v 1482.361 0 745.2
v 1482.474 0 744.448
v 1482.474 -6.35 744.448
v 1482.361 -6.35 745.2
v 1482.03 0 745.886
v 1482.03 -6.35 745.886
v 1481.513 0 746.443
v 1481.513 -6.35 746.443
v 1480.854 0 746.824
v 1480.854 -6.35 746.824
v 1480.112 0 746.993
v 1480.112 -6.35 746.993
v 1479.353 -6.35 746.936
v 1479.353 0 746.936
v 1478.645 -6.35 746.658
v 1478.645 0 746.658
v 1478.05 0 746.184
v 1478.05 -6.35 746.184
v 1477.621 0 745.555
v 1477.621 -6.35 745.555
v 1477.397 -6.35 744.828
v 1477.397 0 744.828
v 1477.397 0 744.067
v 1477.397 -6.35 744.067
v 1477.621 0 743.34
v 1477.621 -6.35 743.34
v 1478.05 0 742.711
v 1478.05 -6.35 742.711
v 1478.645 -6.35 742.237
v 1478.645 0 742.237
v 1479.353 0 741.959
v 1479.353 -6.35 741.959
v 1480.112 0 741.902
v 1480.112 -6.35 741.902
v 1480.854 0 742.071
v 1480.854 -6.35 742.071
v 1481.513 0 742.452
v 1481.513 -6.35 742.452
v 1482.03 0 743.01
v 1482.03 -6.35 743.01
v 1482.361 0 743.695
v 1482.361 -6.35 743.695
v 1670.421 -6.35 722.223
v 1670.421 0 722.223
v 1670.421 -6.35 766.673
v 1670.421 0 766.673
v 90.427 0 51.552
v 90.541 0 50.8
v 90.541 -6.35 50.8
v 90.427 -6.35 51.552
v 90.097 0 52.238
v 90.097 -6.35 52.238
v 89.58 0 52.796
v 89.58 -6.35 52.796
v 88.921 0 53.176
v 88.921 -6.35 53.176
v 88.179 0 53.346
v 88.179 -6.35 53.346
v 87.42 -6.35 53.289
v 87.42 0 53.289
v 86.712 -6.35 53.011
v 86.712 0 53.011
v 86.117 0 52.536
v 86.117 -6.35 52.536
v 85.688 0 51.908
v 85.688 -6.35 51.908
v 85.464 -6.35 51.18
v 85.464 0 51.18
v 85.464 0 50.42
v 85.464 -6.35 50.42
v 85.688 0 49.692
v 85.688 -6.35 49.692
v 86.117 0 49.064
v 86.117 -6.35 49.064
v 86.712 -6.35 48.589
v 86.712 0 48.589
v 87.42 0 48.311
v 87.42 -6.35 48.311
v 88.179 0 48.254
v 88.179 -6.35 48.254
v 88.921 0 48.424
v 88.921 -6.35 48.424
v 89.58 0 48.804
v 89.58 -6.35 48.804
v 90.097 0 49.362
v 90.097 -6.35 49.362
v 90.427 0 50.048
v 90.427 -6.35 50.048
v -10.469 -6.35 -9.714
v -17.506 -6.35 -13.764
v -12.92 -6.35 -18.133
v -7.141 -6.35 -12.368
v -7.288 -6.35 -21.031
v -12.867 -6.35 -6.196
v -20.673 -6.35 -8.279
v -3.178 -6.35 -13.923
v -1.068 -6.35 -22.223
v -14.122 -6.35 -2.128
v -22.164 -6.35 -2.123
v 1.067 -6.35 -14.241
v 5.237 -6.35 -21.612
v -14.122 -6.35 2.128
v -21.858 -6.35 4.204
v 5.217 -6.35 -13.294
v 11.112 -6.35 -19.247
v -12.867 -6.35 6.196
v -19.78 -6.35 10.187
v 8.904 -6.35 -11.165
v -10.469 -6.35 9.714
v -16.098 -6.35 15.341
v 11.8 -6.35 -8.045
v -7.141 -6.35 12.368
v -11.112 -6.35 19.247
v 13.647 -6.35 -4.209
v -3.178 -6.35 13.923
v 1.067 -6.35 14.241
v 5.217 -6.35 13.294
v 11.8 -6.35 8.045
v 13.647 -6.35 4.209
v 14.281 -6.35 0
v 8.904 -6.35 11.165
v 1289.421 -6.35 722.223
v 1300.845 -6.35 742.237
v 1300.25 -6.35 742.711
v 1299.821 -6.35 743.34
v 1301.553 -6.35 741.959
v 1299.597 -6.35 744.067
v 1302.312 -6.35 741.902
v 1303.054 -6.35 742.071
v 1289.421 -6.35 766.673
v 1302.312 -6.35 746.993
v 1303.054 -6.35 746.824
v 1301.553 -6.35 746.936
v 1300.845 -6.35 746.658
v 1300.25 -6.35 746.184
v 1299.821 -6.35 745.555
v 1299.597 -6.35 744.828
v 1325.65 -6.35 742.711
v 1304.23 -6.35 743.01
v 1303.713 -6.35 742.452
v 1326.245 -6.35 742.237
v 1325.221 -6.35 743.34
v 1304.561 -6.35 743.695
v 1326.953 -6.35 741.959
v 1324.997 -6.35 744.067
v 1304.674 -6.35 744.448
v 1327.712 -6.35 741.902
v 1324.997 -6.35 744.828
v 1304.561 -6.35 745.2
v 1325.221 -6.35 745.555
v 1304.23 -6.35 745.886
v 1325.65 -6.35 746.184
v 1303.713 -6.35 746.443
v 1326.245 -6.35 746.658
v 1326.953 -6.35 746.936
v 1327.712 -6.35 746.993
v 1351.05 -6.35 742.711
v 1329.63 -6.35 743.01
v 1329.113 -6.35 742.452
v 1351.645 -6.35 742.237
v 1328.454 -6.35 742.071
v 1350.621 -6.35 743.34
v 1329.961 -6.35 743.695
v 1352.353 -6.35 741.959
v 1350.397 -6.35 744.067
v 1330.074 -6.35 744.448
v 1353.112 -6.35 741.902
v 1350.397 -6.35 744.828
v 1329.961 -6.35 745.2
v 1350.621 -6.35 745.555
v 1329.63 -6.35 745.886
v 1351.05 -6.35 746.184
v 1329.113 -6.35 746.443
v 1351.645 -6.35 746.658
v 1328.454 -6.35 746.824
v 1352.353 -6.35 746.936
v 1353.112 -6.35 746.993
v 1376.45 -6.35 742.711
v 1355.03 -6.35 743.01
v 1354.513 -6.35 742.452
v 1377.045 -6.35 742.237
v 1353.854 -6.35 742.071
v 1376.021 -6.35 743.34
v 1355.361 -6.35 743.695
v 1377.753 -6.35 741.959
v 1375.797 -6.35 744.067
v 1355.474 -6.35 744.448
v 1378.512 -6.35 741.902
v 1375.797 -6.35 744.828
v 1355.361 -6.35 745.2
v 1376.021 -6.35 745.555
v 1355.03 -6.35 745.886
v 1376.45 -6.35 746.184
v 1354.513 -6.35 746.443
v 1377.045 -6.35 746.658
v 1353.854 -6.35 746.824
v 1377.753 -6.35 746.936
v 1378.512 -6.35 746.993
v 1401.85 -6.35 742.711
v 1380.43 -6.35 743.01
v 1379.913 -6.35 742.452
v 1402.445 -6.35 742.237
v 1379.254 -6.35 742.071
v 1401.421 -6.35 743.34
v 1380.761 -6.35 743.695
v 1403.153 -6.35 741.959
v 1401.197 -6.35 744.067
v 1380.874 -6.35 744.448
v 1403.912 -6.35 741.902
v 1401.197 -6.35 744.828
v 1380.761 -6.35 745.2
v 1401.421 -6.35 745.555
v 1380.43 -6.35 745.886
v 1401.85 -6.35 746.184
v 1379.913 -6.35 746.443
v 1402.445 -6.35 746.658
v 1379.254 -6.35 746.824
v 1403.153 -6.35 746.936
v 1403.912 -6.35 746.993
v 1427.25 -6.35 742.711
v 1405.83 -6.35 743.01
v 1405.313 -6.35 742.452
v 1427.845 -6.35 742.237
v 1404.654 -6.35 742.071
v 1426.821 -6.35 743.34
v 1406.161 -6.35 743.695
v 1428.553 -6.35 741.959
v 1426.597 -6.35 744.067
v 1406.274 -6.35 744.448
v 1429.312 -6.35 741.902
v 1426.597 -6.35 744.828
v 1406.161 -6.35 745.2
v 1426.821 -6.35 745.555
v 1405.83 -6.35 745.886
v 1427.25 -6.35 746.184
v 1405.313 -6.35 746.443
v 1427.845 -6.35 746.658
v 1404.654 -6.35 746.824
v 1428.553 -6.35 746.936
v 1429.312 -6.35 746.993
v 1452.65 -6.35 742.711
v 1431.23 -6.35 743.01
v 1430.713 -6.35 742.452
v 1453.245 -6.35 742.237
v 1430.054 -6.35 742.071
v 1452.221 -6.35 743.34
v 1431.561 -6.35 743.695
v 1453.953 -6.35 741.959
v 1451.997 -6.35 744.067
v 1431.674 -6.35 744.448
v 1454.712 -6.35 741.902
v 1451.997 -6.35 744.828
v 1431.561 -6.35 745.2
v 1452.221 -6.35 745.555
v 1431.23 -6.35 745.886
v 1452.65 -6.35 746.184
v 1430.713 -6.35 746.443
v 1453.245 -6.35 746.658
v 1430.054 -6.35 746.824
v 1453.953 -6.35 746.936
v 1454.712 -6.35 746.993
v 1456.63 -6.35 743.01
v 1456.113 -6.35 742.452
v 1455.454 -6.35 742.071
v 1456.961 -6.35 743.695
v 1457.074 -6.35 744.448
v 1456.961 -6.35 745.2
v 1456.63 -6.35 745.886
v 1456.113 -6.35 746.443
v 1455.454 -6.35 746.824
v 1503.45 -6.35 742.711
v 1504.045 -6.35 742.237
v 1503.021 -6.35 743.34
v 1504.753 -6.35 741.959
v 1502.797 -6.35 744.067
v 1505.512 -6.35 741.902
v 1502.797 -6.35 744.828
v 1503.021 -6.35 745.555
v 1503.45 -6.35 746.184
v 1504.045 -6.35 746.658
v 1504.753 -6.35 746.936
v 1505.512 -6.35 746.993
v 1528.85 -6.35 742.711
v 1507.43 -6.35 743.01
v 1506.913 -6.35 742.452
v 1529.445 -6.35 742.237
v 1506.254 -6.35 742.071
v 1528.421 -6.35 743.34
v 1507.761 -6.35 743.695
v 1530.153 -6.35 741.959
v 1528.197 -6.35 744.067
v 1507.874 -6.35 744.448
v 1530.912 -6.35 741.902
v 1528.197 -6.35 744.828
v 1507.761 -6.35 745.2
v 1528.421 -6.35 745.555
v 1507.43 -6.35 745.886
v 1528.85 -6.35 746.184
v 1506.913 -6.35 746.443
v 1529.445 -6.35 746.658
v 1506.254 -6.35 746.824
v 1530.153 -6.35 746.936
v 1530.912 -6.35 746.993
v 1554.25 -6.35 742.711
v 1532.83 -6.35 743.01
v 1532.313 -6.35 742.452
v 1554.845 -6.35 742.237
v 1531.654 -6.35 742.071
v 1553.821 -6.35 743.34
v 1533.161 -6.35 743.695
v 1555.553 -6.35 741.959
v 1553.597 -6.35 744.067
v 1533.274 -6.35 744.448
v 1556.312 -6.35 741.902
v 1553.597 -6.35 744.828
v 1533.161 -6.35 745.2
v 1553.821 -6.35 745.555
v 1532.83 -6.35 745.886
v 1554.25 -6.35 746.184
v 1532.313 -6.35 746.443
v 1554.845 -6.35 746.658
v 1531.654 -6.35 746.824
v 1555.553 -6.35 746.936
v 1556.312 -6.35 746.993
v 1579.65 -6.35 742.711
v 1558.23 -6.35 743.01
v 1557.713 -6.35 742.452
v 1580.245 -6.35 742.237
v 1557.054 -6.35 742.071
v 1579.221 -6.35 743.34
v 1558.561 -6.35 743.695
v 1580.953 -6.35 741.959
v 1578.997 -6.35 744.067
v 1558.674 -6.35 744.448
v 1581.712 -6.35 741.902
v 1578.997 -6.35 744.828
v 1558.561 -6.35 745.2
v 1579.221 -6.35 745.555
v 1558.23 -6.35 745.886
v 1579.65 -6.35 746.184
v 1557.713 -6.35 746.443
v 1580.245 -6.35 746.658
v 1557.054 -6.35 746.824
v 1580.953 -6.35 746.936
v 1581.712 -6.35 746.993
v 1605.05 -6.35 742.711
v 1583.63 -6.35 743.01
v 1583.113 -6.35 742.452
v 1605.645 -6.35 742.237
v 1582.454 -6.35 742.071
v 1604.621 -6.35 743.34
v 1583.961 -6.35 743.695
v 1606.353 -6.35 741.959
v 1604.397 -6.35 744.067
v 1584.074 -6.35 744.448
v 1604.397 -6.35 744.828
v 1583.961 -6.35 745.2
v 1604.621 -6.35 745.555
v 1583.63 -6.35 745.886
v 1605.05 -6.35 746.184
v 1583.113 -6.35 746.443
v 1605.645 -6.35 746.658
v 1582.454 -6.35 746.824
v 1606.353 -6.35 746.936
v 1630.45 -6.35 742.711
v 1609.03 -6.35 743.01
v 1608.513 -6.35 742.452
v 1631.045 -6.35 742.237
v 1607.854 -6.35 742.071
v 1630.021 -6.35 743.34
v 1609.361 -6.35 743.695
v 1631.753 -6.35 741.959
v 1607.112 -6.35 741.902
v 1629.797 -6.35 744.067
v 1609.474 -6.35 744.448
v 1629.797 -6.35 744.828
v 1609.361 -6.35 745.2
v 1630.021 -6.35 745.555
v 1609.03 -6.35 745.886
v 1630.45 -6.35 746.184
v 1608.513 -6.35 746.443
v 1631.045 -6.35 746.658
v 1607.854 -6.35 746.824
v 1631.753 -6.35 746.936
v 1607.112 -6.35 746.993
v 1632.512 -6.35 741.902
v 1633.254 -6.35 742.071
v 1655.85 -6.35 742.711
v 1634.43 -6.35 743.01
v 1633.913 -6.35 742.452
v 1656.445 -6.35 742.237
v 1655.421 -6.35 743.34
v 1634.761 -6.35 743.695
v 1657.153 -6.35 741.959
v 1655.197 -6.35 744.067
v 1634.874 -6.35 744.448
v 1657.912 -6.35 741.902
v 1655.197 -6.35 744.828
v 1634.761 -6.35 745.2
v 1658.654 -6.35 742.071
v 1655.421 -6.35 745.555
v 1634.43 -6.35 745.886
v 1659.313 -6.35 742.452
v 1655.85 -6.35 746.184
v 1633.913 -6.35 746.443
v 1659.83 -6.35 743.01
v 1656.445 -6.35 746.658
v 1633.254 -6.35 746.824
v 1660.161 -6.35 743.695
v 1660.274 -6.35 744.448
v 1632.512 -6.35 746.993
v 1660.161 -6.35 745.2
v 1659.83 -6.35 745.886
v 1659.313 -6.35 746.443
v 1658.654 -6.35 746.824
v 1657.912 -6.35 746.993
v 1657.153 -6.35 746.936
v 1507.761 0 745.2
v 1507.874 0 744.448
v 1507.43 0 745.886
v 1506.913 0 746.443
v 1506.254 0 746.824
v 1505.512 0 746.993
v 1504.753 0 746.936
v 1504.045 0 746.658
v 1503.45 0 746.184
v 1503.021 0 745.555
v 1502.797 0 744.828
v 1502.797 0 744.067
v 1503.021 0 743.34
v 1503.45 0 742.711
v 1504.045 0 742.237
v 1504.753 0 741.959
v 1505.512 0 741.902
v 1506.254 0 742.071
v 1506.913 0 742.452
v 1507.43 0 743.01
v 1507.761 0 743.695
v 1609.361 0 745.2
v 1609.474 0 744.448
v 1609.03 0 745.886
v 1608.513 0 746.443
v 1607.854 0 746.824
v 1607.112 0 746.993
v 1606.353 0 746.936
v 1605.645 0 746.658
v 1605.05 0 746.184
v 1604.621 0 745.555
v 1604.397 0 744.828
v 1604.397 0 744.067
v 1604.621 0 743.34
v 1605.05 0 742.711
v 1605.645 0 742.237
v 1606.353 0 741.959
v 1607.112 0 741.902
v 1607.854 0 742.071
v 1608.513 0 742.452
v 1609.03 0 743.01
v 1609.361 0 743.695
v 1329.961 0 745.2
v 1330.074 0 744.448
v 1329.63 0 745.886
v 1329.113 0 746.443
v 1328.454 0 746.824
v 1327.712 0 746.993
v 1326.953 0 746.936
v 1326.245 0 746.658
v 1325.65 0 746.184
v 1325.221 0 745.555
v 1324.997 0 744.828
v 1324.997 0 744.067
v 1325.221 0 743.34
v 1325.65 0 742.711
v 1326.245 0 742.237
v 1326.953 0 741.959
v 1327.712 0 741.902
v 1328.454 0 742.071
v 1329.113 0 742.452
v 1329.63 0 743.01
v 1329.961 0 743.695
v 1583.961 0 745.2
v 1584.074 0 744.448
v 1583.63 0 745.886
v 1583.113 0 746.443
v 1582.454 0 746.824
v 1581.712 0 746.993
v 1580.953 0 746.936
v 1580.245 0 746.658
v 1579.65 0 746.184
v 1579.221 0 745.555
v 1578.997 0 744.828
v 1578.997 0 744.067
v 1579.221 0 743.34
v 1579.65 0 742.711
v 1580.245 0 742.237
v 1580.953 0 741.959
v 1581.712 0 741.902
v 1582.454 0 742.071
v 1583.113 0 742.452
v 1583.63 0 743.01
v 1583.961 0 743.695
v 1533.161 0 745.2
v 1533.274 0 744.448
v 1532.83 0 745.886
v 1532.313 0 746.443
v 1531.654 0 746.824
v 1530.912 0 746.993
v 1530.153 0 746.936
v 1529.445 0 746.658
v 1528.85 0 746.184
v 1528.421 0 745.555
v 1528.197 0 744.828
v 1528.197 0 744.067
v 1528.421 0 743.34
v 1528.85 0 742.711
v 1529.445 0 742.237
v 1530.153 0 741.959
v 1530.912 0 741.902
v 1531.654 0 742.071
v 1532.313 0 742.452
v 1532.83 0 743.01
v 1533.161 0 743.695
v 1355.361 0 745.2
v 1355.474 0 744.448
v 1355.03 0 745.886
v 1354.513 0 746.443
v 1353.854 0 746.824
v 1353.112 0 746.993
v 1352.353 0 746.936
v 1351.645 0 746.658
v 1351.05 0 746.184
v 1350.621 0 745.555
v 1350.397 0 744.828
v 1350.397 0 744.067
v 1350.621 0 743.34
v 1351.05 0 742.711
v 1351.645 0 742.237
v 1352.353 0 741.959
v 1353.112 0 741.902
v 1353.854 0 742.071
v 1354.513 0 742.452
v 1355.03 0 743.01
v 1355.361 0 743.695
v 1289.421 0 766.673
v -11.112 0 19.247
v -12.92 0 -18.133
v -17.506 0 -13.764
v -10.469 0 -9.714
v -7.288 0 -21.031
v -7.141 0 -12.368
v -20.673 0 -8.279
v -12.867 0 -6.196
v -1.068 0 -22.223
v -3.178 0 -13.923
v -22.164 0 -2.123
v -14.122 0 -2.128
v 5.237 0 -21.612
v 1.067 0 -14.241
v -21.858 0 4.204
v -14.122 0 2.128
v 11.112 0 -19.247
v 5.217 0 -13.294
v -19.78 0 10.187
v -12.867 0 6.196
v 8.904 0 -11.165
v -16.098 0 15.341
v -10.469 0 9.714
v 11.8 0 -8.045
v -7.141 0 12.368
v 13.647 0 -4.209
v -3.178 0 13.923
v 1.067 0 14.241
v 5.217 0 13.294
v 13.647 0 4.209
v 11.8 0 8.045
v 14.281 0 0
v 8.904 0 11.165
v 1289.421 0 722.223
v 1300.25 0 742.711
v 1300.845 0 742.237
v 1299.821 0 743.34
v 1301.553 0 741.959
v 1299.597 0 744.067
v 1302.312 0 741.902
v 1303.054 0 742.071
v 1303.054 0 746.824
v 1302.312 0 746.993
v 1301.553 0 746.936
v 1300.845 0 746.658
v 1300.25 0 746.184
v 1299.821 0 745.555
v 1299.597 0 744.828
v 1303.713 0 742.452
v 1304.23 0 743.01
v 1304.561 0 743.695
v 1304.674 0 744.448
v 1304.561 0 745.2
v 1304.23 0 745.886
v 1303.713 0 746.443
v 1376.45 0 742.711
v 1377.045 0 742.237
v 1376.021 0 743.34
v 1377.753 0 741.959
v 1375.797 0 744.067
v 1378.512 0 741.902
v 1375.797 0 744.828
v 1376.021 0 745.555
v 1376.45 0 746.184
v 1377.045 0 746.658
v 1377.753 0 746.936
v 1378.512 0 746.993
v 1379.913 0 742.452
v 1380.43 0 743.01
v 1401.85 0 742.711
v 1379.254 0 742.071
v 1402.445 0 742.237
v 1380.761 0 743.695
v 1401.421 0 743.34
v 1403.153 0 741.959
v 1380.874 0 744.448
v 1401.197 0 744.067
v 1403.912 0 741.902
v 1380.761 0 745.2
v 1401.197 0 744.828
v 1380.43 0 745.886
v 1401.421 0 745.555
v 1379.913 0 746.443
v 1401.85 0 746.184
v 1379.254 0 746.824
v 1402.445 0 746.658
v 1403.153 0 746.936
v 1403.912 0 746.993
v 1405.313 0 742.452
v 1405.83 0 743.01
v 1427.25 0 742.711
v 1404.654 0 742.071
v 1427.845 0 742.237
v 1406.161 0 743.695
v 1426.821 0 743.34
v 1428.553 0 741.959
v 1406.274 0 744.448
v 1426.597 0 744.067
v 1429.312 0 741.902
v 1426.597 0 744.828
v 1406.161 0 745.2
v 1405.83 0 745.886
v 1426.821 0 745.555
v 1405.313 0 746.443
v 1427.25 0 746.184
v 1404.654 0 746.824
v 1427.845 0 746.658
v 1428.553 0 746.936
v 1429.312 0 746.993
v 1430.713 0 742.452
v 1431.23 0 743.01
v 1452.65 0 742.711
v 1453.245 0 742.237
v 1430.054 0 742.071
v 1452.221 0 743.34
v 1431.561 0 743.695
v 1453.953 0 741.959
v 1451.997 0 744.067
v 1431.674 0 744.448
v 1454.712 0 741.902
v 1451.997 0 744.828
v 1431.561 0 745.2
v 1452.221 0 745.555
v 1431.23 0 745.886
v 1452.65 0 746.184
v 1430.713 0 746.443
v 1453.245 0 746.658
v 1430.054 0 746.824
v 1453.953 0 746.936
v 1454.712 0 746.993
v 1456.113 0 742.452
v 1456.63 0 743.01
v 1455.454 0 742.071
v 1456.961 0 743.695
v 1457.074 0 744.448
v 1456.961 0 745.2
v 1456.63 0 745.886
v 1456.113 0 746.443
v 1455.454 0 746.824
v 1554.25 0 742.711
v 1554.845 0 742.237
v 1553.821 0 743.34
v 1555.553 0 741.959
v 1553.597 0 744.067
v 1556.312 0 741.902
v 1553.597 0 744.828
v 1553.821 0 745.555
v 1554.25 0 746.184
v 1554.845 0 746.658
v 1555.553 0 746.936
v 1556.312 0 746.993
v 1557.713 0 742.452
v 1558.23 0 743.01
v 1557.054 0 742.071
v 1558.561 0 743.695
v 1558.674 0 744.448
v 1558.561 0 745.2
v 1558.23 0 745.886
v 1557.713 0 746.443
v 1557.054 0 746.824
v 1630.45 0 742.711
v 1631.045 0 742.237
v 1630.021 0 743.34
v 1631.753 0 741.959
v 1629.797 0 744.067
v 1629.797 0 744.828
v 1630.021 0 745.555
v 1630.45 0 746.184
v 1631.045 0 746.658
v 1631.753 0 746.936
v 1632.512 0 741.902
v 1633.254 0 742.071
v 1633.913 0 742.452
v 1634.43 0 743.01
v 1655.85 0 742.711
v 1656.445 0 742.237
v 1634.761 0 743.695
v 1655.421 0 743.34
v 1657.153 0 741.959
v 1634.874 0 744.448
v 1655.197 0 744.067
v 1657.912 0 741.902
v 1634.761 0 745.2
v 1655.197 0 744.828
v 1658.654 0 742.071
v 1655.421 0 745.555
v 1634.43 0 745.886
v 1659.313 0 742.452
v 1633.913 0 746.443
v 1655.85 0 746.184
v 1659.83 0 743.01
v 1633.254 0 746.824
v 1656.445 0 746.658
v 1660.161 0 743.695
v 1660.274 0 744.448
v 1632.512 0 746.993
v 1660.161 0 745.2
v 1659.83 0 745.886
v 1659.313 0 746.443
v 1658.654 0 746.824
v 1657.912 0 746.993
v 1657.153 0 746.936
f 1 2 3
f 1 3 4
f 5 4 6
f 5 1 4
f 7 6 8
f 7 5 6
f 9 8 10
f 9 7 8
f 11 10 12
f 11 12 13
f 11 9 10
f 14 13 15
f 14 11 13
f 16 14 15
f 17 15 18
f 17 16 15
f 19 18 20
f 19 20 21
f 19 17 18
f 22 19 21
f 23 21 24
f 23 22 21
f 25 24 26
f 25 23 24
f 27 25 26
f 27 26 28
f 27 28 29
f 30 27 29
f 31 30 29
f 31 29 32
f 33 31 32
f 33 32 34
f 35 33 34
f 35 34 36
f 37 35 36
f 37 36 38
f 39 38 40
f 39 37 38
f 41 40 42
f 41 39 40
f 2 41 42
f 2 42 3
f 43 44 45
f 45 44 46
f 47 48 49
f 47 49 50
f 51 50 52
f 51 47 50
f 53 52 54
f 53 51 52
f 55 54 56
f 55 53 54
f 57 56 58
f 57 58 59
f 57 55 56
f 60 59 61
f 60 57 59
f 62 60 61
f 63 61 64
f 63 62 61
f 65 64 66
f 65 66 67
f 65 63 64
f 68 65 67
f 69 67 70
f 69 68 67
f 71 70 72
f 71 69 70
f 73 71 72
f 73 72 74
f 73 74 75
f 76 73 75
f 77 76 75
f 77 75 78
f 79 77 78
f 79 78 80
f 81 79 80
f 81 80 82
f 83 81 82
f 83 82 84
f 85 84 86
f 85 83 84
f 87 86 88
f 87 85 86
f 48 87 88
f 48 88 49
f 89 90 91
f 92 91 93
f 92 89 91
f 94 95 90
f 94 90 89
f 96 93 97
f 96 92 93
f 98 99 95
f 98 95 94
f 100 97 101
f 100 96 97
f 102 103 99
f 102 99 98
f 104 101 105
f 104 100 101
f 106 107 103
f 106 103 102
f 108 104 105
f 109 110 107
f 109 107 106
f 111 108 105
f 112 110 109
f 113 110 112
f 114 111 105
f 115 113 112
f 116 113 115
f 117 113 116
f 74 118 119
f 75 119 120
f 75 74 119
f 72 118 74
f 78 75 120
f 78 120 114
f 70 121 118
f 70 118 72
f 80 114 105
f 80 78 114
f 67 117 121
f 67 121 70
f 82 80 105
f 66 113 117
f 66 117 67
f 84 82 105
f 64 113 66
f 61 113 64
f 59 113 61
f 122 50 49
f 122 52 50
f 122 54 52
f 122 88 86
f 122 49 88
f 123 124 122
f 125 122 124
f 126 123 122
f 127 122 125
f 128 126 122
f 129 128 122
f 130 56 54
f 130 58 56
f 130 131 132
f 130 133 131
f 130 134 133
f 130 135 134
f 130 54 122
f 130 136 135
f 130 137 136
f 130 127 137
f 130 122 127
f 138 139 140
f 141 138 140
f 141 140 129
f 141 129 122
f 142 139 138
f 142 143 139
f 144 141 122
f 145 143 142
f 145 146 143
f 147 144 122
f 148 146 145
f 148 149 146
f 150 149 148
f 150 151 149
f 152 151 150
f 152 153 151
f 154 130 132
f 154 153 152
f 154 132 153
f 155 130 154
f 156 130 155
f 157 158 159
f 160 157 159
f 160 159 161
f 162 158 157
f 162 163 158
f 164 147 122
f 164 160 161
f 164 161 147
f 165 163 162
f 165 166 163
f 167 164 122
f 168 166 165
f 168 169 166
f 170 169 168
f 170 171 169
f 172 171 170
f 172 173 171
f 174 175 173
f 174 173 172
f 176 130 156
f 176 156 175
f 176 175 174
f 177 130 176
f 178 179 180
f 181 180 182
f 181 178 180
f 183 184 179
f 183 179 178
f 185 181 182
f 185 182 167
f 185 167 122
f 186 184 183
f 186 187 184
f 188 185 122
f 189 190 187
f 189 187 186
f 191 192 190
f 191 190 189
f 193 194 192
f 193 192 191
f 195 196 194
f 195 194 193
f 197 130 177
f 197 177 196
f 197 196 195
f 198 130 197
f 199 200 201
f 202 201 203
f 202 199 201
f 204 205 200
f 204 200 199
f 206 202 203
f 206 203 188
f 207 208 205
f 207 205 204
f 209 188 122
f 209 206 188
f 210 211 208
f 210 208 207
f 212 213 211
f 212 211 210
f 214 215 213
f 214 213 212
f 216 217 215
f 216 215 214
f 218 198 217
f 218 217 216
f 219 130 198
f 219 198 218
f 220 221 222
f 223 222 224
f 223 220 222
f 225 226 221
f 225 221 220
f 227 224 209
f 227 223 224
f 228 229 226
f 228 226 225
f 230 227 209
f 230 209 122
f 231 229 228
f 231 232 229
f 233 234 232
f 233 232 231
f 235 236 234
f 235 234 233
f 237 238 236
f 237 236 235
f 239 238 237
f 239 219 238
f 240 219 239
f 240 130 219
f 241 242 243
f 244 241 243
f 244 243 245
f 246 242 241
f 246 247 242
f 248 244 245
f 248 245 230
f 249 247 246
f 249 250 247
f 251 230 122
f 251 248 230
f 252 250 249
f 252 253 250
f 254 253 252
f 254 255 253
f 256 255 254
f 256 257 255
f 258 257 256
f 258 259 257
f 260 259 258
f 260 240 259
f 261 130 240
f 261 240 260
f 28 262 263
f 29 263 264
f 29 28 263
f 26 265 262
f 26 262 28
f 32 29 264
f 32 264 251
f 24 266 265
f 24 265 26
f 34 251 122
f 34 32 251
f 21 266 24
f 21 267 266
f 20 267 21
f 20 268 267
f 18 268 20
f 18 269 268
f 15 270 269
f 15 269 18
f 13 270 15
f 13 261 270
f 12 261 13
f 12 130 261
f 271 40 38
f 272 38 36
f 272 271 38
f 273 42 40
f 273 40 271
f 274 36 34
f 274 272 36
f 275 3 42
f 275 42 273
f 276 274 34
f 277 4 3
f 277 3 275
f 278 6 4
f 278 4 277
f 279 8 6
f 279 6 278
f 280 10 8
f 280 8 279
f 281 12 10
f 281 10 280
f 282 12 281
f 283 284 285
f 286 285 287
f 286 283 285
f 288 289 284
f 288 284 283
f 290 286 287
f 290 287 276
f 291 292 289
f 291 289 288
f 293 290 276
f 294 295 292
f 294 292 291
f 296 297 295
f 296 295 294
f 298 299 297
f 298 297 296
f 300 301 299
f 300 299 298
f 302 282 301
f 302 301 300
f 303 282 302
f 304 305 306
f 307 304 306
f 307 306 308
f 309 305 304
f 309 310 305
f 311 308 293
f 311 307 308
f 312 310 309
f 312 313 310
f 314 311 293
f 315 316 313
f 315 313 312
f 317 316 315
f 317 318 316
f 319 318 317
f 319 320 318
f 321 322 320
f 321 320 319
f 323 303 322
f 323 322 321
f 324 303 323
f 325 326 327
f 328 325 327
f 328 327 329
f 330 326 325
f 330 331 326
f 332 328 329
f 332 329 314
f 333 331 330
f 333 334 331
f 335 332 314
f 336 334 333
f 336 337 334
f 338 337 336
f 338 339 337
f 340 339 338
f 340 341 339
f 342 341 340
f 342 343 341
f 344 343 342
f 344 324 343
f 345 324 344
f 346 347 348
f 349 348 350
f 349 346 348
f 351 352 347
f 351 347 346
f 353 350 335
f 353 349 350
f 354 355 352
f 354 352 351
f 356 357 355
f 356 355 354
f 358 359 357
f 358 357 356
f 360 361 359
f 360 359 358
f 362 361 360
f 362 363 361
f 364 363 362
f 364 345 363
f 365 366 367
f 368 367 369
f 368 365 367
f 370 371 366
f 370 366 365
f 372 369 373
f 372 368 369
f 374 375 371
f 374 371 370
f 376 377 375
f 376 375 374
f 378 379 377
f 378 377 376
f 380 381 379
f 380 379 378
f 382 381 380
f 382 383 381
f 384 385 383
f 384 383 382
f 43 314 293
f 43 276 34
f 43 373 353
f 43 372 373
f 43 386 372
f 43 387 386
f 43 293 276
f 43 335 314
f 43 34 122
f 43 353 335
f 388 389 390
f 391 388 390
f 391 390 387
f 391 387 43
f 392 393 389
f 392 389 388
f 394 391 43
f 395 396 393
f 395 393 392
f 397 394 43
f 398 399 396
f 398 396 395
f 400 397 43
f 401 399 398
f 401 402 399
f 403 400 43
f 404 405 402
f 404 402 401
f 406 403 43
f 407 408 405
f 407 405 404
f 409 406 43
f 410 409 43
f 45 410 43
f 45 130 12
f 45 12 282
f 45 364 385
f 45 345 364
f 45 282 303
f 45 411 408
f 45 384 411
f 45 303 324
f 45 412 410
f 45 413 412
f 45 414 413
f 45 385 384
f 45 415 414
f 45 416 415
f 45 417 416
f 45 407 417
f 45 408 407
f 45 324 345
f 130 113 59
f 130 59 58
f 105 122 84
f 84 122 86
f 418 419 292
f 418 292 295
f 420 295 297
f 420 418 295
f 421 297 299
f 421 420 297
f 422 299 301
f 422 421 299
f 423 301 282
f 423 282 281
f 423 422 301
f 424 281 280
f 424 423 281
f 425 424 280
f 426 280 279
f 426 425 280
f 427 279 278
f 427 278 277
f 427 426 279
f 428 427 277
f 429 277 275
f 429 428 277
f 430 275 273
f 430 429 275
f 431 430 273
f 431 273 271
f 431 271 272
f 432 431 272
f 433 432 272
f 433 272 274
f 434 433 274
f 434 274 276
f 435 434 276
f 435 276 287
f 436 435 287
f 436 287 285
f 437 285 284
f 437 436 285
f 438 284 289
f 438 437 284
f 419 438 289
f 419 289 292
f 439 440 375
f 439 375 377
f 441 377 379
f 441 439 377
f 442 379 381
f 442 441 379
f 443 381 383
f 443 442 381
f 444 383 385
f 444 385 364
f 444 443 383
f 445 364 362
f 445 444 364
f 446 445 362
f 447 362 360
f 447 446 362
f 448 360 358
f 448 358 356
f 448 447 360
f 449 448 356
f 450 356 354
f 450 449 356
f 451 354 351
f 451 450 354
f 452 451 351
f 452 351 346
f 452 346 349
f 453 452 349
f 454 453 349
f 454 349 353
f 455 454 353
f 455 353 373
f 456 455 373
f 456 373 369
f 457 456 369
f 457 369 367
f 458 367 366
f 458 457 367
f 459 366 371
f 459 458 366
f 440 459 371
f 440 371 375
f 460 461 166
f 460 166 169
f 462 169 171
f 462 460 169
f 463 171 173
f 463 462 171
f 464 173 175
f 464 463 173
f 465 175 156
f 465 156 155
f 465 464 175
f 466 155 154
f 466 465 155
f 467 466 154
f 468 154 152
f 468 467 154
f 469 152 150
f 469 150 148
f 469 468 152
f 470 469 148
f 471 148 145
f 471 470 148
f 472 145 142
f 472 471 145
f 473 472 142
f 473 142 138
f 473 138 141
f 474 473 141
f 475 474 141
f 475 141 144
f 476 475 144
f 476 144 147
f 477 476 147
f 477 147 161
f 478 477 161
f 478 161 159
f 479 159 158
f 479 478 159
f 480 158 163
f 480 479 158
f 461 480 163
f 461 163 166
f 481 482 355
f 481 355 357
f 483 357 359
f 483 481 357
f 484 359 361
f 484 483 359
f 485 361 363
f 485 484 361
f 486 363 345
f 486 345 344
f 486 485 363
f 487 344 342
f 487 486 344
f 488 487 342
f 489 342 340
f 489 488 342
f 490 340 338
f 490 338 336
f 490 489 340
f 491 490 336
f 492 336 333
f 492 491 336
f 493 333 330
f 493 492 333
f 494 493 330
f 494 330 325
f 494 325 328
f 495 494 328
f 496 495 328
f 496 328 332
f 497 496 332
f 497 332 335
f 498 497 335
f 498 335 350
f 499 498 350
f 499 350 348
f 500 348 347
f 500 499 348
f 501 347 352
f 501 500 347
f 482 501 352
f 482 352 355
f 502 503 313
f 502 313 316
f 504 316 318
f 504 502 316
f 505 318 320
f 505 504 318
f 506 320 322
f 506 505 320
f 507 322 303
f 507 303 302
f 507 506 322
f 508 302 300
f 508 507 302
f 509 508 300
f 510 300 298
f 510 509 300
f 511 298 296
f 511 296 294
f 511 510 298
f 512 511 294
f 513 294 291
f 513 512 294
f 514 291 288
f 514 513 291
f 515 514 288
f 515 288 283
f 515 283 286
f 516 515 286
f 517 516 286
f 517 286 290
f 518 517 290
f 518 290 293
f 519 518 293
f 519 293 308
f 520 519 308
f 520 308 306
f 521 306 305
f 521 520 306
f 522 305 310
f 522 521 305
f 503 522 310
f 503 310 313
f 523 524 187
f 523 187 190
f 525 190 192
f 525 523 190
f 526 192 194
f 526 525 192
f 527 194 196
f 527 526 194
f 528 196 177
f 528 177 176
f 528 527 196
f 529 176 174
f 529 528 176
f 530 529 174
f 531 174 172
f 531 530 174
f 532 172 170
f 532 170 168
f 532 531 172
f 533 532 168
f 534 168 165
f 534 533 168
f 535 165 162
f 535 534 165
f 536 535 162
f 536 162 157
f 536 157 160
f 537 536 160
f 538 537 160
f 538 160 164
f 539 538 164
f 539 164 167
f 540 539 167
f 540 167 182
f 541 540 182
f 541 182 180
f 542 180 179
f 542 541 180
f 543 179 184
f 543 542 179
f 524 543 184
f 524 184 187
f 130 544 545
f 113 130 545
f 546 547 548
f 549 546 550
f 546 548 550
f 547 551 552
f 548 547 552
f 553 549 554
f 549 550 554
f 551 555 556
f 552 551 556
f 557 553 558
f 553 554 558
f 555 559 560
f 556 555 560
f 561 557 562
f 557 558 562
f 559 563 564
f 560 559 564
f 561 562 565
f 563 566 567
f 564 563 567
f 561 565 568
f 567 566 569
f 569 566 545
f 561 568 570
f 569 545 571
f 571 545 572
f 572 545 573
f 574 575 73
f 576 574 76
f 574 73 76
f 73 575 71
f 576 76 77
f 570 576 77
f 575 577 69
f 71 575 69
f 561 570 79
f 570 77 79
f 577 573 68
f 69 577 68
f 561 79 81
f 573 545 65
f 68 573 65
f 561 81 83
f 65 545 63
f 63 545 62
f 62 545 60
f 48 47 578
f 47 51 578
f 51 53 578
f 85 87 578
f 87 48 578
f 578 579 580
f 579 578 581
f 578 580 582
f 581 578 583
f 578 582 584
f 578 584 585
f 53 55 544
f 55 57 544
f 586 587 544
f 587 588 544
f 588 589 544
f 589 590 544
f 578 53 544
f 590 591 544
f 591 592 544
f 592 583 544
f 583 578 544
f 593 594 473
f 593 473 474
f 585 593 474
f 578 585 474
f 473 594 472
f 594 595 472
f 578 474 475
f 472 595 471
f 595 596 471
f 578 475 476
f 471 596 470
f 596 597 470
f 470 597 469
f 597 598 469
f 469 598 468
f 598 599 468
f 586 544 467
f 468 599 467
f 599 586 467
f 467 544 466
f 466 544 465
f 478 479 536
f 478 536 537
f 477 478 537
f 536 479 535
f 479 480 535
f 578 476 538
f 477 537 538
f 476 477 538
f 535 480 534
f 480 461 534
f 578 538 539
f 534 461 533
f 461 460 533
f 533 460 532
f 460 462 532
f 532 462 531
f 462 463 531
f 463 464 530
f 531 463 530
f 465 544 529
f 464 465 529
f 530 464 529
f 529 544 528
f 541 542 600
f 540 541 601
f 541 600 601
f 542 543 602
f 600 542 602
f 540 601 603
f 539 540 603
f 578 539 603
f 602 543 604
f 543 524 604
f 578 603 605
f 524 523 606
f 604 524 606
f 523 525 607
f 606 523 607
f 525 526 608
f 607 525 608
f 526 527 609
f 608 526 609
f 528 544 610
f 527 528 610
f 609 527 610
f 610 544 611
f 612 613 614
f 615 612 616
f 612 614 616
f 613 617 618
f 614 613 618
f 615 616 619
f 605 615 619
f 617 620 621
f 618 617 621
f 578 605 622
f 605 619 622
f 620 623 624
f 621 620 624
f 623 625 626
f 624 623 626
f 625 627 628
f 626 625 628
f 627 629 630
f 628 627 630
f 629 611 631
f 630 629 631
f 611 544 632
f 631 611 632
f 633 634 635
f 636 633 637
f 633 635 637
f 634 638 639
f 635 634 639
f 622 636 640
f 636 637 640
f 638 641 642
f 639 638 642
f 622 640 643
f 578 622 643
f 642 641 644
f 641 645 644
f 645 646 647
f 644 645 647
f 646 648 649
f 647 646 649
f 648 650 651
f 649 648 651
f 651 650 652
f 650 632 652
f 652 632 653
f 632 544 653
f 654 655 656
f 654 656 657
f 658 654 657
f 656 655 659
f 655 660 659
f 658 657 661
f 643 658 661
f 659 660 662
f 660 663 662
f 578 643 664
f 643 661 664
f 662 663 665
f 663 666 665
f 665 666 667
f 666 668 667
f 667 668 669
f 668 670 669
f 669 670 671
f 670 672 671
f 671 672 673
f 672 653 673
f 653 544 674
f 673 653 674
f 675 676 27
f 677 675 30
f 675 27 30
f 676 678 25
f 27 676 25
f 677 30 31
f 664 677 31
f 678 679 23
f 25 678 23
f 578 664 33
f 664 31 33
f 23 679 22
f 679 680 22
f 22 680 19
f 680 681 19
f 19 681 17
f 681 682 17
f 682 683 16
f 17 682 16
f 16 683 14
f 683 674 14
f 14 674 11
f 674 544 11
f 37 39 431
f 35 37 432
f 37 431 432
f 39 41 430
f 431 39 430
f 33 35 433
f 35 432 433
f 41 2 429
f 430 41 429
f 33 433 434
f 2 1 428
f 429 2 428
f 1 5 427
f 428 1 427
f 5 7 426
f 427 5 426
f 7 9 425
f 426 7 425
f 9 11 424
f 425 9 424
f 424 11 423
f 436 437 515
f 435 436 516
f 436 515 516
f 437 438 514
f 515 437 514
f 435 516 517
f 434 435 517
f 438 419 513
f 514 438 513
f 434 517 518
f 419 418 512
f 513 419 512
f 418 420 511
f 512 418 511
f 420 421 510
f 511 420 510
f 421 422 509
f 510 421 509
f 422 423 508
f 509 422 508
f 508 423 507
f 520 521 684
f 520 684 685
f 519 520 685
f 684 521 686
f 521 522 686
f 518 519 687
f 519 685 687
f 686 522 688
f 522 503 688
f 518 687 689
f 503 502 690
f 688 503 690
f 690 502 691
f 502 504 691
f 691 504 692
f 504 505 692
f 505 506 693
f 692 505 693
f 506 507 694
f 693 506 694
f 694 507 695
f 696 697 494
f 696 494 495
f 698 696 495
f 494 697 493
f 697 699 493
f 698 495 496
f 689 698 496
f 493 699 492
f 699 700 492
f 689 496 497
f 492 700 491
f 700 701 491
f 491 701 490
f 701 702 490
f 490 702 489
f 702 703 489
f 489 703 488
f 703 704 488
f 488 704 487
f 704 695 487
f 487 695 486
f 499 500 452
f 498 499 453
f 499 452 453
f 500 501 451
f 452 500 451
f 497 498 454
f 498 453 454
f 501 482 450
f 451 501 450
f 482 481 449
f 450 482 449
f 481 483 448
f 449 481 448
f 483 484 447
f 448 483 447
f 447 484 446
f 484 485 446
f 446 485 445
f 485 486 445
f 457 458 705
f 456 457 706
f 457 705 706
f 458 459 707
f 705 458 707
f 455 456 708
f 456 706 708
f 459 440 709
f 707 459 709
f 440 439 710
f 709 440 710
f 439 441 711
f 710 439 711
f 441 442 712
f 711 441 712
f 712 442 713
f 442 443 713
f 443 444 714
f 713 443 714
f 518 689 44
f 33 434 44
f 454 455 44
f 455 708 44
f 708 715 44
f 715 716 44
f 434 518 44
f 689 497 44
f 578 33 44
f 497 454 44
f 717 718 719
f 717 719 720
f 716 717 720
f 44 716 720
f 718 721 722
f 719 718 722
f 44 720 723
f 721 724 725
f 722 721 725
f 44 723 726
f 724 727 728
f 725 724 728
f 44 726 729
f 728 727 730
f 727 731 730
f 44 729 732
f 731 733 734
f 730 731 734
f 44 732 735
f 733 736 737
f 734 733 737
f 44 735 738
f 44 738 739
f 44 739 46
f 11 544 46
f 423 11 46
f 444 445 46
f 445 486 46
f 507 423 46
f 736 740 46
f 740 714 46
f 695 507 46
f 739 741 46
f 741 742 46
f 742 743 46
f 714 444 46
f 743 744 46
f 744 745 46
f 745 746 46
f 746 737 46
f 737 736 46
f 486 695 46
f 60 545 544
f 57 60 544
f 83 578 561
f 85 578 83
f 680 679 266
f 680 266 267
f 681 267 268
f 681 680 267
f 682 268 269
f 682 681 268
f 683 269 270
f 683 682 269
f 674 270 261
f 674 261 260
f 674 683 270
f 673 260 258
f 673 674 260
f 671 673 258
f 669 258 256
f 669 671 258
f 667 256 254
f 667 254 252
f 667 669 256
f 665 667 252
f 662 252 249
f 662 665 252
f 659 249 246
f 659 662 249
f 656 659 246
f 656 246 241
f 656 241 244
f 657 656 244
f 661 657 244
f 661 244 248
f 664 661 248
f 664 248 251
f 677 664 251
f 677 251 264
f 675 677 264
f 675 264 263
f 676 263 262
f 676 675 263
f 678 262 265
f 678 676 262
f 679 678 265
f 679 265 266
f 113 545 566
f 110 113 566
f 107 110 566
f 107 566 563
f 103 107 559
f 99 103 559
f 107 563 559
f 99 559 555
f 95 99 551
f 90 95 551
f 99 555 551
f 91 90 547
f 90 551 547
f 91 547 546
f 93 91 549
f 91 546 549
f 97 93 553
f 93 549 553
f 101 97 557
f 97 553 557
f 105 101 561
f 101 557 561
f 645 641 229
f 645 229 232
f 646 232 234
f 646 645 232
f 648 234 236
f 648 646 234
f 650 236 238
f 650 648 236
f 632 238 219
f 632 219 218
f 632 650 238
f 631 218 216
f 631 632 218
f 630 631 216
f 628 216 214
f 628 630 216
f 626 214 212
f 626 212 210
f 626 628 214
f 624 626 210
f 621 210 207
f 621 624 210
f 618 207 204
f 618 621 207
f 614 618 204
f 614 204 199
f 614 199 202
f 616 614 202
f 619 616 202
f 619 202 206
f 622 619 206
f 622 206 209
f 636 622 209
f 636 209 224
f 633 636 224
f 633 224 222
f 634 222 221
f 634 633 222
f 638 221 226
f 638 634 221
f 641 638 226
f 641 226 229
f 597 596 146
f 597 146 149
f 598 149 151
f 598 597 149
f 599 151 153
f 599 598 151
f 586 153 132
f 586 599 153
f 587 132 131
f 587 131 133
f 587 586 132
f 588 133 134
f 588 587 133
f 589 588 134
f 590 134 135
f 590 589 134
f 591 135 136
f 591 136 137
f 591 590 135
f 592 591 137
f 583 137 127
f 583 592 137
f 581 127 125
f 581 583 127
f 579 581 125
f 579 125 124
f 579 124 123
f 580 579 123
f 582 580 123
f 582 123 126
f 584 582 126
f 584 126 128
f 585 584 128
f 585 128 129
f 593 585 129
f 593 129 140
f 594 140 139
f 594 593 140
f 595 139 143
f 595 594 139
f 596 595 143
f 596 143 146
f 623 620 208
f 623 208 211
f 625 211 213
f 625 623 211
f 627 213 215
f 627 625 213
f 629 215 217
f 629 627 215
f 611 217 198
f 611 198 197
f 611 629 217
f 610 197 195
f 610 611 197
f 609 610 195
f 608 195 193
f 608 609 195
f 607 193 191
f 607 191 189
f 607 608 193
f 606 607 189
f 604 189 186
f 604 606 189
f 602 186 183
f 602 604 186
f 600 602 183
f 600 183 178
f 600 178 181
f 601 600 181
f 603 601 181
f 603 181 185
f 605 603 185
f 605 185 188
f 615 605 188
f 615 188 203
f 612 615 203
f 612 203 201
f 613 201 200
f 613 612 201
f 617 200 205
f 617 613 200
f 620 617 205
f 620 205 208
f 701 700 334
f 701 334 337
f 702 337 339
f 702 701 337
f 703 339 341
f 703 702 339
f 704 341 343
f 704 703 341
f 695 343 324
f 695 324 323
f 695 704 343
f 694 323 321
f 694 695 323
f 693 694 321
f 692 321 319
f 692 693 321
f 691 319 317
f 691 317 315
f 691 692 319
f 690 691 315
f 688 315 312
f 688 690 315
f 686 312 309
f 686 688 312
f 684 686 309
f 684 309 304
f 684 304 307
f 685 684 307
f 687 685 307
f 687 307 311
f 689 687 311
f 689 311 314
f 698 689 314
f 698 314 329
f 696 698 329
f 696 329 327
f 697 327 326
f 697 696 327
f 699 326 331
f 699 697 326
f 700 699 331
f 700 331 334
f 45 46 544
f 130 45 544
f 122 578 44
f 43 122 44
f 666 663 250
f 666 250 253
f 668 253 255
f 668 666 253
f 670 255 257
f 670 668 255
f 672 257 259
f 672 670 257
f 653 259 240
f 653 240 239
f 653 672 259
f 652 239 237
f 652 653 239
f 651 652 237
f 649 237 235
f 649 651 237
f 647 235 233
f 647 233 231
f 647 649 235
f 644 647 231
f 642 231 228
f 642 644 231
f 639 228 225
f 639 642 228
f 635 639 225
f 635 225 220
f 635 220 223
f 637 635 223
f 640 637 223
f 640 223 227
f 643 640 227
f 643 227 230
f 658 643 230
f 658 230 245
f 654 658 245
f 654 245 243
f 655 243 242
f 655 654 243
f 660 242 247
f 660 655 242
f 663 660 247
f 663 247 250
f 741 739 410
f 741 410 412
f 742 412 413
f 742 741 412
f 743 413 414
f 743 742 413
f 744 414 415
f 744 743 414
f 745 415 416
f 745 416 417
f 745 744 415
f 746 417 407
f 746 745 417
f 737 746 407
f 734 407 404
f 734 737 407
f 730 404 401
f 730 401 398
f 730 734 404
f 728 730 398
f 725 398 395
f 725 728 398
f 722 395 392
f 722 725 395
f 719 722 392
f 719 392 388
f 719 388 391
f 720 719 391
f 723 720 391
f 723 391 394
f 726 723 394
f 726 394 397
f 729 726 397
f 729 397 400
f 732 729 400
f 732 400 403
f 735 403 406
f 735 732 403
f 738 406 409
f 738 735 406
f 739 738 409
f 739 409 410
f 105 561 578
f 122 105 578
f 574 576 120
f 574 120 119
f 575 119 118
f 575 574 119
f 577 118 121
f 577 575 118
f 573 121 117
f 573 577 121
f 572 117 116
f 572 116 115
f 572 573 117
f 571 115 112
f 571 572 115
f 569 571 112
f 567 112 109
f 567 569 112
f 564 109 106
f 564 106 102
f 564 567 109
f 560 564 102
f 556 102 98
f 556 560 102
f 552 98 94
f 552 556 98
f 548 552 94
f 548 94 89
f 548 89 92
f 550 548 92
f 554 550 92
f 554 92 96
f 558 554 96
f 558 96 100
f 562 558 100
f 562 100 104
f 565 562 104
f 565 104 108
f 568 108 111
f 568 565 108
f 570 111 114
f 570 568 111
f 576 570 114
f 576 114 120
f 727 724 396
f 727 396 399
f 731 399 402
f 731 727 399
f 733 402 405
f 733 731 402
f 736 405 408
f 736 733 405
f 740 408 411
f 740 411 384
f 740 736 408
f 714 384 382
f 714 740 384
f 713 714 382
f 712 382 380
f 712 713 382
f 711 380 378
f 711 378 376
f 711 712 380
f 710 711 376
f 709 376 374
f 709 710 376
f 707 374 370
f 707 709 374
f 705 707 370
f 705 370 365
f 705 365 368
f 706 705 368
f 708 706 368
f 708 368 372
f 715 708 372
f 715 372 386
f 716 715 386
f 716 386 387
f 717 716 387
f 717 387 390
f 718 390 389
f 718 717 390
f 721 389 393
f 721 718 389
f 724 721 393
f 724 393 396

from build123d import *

# Parameters (mm, degrees)
F0_R     = 14.28115
F0_R_2   = 2.5527
F1_DEPTH = 6.35


with BuildPart() as f1:
    # F0 (on Front) → F1 (new body)
    with BuildSketch(Plane.XZ):
        with BuildLine():
            Line((1289.421224, 766.672692), (-11.1125, 19.247415))
            ThreePointArc((-11.1125, 19.247415), (-19.28566, -11.134581), (11.1125, -19.247415))
            Line((11.1125, -19.247415), (1289.421229, 722.222692))
            Line((1289.421229, 722.222692), (1289.421224, 766.672692))
        make_face()
        Circle(F0_R, mode=Mode.SUBTRACT)
        with Locations((87.988181, 50.8)):
            Circle(F0_R_2, mode=Mode.SUBTRACT)
        Polygon((1670.421226, 766.672692), (1289.421224, 766.672692), (1289.421229, 722.222692), (1670.421226, 722.222692), align=None)
        with Locations((1302.121226, 744.447692)):
            Circle(F0_R_2, mode=Mode.SUBTRACT)
        with Locations((1327.521226, 744.447692)):
            Circle(F0_R_2, mode=Mode.SUBTRACT)
        with Locations((1352.921226, 744.447692)):
            Circle(F0_R_2, mode=Mode.SUBTRACT)
        with Locations((1378.321226, 744.447692)):
            Circle(F0_R_2, mode=Mode.SUBTRACT)
        with Locations((1403.721226, 744.447692)):
            Circle(F0_R_2, mode=Mode.SUBTRACT)
        with Locations((1429.121226, 744.447692)):
            Circle(F0_R_2, mode=Mode.SUBTRACT)
        with Locations((1454.521226, 744.447692)):
            Circle(F0_R_2, mode=Mode.SUBTRACT)
        with Locations((1479.921226, 744.447692)):
            Circle(F0_R_2, mode=Mode.SUBTRACT)
        with Locations((1505.321226, 744.447692)):
            Circle(F0_R_2, mode=Mode.SUBTRACT)
        with Locations((1530.721226, 744.447692)):
            Circle(F0_R_2, mode=Mode.SUBTRACT)
        with Locations((1556.121226, 744.447692)):
            Circle(F0_R_2, mode=Mode.SUBTRACT)
        with Locations((1581.521226, 744.447692)):
            Circle(F0_R_2, mode=Mode.SUBTRACT)
        with Locations((1606.921226, 744.447692)):
            Circle(F0_R_2, mode=Mode.SUBTRACT)
        with Locations((1632.321226, 744.447692)):
            Circle(F0_R_2, mode=Mode.SUBTRACT)
        with Locations((1657.721226, 744.447692)):
            Circle(F0_R_2, mode=Mode.SUBTRACT)
    extrude(amount=F1_DEPTH)


solid = f1.part
